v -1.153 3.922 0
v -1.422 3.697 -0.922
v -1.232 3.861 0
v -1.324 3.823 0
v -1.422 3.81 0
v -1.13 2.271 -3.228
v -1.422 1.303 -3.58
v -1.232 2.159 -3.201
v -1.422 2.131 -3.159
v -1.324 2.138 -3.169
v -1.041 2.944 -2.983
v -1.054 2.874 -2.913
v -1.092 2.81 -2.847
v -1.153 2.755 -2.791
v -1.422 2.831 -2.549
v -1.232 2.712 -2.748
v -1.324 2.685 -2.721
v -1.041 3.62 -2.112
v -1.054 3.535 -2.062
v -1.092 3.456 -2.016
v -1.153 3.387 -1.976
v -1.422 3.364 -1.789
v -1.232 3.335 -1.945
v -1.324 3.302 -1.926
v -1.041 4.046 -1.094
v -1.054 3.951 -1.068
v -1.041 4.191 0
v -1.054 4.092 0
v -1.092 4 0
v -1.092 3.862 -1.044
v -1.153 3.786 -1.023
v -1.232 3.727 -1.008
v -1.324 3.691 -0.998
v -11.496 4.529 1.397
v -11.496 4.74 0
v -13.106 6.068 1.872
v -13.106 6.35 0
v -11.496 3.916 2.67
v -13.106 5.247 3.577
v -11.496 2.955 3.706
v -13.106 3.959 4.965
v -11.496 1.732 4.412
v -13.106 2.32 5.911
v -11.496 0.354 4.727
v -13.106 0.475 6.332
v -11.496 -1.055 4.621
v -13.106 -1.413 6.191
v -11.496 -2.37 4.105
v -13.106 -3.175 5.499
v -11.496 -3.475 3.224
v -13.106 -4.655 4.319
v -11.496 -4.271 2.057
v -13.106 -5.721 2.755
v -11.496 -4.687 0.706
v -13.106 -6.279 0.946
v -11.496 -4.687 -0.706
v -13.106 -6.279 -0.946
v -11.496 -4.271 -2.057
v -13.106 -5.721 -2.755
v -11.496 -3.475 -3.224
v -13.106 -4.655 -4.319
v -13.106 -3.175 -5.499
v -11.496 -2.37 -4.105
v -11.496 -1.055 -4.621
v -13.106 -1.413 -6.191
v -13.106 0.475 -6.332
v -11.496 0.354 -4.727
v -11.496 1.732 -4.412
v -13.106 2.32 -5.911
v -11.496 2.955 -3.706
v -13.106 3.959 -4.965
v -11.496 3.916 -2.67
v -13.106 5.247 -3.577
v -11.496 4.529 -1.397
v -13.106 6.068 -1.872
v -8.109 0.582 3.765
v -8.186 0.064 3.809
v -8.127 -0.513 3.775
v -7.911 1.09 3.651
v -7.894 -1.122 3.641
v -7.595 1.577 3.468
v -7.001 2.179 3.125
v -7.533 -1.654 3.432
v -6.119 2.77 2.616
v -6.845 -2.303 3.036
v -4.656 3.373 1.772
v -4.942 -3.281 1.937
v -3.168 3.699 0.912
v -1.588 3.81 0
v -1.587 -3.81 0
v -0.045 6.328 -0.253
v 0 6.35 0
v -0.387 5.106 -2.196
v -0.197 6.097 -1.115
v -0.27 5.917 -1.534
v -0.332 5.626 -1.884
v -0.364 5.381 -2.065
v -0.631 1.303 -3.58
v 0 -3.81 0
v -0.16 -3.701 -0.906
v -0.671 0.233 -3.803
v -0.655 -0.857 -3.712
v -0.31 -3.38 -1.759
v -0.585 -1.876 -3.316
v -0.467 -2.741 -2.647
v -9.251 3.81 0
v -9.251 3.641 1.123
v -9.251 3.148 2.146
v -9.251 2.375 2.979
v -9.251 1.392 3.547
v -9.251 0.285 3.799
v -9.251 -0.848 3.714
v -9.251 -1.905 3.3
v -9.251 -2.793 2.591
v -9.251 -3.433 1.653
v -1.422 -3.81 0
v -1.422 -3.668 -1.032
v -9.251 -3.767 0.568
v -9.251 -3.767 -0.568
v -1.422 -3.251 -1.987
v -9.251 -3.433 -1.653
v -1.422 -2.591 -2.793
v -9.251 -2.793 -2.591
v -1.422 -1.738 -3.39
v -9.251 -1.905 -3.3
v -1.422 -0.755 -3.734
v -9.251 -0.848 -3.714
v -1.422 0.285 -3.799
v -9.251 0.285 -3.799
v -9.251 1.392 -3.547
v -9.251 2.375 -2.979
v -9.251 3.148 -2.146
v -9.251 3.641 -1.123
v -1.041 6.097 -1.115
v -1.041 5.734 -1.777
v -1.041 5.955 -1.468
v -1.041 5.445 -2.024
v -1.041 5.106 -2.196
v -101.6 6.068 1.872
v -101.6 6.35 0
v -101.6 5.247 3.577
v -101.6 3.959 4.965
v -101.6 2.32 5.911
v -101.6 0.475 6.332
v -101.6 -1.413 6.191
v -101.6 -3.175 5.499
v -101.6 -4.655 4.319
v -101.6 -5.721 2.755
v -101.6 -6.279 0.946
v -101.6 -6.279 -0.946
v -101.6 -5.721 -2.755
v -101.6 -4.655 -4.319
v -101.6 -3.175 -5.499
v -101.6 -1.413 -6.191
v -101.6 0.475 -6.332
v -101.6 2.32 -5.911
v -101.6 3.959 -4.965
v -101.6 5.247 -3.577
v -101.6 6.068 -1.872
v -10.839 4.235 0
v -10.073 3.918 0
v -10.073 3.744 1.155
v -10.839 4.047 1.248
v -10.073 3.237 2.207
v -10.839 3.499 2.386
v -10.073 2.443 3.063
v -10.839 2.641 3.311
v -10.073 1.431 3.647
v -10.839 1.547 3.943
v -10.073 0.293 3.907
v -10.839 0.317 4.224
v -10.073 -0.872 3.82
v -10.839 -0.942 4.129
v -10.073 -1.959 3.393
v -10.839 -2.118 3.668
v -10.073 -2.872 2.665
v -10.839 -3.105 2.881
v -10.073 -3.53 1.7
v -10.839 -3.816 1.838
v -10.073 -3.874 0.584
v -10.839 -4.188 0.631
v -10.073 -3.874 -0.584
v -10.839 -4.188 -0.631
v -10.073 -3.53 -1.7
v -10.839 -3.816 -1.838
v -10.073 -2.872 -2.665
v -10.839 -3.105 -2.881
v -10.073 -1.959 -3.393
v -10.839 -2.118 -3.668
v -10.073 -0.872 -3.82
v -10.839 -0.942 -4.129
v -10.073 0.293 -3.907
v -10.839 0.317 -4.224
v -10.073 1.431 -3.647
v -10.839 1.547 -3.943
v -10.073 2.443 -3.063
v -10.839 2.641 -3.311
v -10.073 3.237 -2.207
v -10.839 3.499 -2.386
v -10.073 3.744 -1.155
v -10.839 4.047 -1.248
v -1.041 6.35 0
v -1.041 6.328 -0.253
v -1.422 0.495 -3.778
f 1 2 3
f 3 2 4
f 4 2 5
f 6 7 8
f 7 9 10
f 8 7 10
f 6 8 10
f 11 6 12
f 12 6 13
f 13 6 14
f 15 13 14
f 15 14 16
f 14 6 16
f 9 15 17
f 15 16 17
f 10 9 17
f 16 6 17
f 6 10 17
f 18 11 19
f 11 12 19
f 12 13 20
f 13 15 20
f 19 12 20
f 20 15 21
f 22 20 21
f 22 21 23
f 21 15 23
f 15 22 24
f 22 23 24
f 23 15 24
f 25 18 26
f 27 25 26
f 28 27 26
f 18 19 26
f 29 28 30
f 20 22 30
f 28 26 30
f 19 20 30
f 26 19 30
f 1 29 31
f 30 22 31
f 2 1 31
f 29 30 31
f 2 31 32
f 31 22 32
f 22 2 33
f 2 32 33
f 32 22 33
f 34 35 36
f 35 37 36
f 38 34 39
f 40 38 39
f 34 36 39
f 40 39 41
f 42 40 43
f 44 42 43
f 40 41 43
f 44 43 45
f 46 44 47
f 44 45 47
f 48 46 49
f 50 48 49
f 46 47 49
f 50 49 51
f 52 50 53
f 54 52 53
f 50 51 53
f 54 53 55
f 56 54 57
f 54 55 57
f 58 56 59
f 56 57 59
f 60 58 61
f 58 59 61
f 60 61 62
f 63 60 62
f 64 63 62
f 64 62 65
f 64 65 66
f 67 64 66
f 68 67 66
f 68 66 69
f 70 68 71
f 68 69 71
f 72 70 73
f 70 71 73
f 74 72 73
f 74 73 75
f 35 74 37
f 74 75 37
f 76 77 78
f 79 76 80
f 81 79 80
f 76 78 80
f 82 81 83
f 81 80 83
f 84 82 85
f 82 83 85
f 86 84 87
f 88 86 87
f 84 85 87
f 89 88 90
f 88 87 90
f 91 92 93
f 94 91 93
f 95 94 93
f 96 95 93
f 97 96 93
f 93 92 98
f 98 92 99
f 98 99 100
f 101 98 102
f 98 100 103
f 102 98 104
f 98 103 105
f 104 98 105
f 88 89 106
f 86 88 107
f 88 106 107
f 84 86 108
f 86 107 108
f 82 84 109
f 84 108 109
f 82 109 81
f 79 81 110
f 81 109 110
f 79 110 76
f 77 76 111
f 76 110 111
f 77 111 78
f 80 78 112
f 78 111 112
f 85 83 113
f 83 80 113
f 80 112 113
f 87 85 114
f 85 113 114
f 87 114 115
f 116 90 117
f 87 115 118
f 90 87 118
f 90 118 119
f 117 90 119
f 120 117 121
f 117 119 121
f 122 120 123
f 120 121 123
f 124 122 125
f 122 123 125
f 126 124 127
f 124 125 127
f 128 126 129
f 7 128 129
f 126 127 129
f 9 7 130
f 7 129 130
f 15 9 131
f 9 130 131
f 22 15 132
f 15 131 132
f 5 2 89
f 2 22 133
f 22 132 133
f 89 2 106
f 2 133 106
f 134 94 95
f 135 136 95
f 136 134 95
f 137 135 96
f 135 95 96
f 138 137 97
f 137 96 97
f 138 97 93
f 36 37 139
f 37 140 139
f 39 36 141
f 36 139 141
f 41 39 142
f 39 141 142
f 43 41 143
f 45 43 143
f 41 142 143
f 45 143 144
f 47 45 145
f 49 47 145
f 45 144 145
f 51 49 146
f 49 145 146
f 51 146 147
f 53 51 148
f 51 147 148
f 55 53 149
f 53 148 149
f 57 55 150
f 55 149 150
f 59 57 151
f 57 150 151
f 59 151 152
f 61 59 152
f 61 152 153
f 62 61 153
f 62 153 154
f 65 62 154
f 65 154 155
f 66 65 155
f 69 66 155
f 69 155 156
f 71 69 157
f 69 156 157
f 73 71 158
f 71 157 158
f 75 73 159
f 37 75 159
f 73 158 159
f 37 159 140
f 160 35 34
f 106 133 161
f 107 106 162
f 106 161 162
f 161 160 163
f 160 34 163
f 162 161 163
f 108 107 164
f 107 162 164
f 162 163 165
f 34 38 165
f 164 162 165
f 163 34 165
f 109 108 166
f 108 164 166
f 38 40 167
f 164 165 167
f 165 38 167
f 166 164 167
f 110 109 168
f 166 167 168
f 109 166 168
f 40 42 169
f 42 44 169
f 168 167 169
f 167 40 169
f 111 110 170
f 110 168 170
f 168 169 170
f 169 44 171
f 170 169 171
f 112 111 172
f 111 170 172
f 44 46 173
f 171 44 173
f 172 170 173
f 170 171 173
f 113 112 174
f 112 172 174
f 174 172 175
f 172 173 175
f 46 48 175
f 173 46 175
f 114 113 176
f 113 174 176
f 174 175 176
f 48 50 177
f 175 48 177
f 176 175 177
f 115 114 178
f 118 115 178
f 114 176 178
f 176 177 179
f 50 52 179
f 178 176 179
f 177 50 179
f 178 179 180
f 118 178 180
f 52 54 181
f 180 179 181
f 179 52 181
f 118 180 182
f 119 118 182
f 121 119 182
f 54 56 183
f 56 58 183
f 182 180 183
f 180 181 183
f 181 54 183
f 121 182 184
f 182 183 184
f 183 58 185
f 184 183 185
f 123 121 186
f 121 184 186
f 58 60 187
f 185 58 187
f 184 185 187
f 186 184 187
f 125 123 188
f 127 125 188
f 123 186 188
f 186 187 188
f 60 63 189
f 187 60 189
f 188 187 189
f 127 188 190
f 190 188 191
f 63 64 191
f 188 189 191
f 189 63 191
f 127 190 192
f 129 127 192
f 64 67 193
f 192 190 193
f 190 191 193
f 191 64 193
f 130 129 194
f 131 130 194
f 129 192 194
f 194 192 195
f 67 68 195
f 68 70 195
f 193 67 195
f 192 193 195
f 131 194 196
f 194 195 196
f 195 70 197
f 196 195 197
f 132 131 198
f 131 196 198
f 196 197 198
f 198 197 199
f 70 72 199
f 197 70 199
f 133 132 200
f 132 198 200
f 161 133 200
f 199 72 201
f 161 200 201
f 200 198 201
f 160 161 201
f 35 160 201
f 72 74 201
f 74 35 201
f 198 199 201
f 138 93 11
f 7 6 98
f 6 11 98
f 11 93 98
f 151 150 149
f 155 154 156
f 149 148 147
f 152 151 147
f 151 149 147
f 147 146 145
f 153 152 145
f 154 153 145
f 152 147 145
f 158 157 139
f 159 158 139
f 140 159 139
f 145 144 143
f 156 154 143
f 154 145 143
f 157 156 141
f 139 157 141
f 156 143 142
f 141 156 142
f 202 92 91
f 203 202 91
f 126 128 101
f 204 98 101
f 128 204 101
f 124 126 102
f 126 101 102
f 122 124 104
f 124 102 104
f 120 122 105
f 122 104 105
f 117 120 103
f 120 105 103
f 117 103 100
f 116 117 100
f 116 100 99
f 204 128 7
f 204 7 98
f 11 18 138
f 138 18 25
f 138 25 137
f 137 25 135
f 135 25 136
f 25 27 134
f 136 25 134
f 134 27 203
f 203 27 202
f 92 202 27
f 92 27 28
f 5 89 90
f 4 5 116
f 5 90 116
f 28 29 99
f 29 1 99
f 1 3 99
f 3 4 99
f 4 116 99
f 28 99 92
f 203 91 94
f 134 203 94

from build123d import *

# Parameters (mm, degrees)
F3_DEPTH = 12.7
F5_DEPTH = 1.5875
F7_DEPTH = 12.7


with BuildPart() as f1:
    # F0 (on Top) → F1 (revolve)
    with BuildSketch(Plane.XY):
        with BuildLine():
            Line((-101.6, 0), (0, 0))
            Line((0, 0), (0, 6.35))
            Line((0, 6.35), (-1.0414, 6.35))
            Line((-1.0414, 6.35), (-1.0414, 4.191))
            ThreePointArc((-1.0414, 4.191), (-1.152992, 3.921592), (-1.4224, 3.81))
            Line((-1.4224, 3.81), (-9.251272, 3.81))
            ThreePointArc((-9.251272, 3.81), (-10.466292, 4.051682), (-11.496336, 4.739936))
            Line((-11.496336, 4.739936), (-13.1064, 6.35))
            Line((-13.1064, 6.35), (-101.6, 6.35))
            Line((-101.6, 6.35), (-101.6, 0))
        make_face()
    revolve(axis=Axis((-50.8, 0, 0), (1, 0, 0)))

    # F2 (on Front) → F3 (cut, symmetric)
    with BuildSketch(Plane.XZ):
        Polygon((-1.5875, 0), (0, 0), (0, 6.35), (-12.586023, 6.35), align=None)
    extrude(amount=F3_DEPTH, both=True, mode=Mode.SUBTRACT)

    # F4 (on face) → F5 (cut)
    with BuildSketch(Plane.YZ):
        with BuildLine():
            Line((-6.604, 0), (-6.604, -6.604))
            Line((-6.604, -6.604), (6.35, -6.604))
            Line((6.35, -6.604), (6.35, 0))
            Line((6.35, 0), (6.327862, -0.253033))
            Line((6.327862, -0.253033), (6.096889, -1.115039))
            ThreePointArc((6.096889, -1.115039), (5.733909, -1.776663), (5.106439, -2.195926))
            Line((5.106439, -2.195926), (1.303097, -3.580229))
            ThreePointArc((1.303097, -3.580229), (-2.185326, -3.120969), (-3.81, 0))
            Line((-3.81, 0), (-6.604, 0))
        make_face()
    extrude(amount=-F5_DEPTH, mode=Mode.SUBTRACT)

    # F6 (on Front) → F7 (cut, symmetric)
    with BuildSketch(Plane.XZ):
        Polygon((0, -4.24096), (0, 0), (-0.747796, -4.24096), align=None)
    extrude(amount=F7_DEPTH, both=True, mode=Mode.SUBTRACT)


solid = f1.part
